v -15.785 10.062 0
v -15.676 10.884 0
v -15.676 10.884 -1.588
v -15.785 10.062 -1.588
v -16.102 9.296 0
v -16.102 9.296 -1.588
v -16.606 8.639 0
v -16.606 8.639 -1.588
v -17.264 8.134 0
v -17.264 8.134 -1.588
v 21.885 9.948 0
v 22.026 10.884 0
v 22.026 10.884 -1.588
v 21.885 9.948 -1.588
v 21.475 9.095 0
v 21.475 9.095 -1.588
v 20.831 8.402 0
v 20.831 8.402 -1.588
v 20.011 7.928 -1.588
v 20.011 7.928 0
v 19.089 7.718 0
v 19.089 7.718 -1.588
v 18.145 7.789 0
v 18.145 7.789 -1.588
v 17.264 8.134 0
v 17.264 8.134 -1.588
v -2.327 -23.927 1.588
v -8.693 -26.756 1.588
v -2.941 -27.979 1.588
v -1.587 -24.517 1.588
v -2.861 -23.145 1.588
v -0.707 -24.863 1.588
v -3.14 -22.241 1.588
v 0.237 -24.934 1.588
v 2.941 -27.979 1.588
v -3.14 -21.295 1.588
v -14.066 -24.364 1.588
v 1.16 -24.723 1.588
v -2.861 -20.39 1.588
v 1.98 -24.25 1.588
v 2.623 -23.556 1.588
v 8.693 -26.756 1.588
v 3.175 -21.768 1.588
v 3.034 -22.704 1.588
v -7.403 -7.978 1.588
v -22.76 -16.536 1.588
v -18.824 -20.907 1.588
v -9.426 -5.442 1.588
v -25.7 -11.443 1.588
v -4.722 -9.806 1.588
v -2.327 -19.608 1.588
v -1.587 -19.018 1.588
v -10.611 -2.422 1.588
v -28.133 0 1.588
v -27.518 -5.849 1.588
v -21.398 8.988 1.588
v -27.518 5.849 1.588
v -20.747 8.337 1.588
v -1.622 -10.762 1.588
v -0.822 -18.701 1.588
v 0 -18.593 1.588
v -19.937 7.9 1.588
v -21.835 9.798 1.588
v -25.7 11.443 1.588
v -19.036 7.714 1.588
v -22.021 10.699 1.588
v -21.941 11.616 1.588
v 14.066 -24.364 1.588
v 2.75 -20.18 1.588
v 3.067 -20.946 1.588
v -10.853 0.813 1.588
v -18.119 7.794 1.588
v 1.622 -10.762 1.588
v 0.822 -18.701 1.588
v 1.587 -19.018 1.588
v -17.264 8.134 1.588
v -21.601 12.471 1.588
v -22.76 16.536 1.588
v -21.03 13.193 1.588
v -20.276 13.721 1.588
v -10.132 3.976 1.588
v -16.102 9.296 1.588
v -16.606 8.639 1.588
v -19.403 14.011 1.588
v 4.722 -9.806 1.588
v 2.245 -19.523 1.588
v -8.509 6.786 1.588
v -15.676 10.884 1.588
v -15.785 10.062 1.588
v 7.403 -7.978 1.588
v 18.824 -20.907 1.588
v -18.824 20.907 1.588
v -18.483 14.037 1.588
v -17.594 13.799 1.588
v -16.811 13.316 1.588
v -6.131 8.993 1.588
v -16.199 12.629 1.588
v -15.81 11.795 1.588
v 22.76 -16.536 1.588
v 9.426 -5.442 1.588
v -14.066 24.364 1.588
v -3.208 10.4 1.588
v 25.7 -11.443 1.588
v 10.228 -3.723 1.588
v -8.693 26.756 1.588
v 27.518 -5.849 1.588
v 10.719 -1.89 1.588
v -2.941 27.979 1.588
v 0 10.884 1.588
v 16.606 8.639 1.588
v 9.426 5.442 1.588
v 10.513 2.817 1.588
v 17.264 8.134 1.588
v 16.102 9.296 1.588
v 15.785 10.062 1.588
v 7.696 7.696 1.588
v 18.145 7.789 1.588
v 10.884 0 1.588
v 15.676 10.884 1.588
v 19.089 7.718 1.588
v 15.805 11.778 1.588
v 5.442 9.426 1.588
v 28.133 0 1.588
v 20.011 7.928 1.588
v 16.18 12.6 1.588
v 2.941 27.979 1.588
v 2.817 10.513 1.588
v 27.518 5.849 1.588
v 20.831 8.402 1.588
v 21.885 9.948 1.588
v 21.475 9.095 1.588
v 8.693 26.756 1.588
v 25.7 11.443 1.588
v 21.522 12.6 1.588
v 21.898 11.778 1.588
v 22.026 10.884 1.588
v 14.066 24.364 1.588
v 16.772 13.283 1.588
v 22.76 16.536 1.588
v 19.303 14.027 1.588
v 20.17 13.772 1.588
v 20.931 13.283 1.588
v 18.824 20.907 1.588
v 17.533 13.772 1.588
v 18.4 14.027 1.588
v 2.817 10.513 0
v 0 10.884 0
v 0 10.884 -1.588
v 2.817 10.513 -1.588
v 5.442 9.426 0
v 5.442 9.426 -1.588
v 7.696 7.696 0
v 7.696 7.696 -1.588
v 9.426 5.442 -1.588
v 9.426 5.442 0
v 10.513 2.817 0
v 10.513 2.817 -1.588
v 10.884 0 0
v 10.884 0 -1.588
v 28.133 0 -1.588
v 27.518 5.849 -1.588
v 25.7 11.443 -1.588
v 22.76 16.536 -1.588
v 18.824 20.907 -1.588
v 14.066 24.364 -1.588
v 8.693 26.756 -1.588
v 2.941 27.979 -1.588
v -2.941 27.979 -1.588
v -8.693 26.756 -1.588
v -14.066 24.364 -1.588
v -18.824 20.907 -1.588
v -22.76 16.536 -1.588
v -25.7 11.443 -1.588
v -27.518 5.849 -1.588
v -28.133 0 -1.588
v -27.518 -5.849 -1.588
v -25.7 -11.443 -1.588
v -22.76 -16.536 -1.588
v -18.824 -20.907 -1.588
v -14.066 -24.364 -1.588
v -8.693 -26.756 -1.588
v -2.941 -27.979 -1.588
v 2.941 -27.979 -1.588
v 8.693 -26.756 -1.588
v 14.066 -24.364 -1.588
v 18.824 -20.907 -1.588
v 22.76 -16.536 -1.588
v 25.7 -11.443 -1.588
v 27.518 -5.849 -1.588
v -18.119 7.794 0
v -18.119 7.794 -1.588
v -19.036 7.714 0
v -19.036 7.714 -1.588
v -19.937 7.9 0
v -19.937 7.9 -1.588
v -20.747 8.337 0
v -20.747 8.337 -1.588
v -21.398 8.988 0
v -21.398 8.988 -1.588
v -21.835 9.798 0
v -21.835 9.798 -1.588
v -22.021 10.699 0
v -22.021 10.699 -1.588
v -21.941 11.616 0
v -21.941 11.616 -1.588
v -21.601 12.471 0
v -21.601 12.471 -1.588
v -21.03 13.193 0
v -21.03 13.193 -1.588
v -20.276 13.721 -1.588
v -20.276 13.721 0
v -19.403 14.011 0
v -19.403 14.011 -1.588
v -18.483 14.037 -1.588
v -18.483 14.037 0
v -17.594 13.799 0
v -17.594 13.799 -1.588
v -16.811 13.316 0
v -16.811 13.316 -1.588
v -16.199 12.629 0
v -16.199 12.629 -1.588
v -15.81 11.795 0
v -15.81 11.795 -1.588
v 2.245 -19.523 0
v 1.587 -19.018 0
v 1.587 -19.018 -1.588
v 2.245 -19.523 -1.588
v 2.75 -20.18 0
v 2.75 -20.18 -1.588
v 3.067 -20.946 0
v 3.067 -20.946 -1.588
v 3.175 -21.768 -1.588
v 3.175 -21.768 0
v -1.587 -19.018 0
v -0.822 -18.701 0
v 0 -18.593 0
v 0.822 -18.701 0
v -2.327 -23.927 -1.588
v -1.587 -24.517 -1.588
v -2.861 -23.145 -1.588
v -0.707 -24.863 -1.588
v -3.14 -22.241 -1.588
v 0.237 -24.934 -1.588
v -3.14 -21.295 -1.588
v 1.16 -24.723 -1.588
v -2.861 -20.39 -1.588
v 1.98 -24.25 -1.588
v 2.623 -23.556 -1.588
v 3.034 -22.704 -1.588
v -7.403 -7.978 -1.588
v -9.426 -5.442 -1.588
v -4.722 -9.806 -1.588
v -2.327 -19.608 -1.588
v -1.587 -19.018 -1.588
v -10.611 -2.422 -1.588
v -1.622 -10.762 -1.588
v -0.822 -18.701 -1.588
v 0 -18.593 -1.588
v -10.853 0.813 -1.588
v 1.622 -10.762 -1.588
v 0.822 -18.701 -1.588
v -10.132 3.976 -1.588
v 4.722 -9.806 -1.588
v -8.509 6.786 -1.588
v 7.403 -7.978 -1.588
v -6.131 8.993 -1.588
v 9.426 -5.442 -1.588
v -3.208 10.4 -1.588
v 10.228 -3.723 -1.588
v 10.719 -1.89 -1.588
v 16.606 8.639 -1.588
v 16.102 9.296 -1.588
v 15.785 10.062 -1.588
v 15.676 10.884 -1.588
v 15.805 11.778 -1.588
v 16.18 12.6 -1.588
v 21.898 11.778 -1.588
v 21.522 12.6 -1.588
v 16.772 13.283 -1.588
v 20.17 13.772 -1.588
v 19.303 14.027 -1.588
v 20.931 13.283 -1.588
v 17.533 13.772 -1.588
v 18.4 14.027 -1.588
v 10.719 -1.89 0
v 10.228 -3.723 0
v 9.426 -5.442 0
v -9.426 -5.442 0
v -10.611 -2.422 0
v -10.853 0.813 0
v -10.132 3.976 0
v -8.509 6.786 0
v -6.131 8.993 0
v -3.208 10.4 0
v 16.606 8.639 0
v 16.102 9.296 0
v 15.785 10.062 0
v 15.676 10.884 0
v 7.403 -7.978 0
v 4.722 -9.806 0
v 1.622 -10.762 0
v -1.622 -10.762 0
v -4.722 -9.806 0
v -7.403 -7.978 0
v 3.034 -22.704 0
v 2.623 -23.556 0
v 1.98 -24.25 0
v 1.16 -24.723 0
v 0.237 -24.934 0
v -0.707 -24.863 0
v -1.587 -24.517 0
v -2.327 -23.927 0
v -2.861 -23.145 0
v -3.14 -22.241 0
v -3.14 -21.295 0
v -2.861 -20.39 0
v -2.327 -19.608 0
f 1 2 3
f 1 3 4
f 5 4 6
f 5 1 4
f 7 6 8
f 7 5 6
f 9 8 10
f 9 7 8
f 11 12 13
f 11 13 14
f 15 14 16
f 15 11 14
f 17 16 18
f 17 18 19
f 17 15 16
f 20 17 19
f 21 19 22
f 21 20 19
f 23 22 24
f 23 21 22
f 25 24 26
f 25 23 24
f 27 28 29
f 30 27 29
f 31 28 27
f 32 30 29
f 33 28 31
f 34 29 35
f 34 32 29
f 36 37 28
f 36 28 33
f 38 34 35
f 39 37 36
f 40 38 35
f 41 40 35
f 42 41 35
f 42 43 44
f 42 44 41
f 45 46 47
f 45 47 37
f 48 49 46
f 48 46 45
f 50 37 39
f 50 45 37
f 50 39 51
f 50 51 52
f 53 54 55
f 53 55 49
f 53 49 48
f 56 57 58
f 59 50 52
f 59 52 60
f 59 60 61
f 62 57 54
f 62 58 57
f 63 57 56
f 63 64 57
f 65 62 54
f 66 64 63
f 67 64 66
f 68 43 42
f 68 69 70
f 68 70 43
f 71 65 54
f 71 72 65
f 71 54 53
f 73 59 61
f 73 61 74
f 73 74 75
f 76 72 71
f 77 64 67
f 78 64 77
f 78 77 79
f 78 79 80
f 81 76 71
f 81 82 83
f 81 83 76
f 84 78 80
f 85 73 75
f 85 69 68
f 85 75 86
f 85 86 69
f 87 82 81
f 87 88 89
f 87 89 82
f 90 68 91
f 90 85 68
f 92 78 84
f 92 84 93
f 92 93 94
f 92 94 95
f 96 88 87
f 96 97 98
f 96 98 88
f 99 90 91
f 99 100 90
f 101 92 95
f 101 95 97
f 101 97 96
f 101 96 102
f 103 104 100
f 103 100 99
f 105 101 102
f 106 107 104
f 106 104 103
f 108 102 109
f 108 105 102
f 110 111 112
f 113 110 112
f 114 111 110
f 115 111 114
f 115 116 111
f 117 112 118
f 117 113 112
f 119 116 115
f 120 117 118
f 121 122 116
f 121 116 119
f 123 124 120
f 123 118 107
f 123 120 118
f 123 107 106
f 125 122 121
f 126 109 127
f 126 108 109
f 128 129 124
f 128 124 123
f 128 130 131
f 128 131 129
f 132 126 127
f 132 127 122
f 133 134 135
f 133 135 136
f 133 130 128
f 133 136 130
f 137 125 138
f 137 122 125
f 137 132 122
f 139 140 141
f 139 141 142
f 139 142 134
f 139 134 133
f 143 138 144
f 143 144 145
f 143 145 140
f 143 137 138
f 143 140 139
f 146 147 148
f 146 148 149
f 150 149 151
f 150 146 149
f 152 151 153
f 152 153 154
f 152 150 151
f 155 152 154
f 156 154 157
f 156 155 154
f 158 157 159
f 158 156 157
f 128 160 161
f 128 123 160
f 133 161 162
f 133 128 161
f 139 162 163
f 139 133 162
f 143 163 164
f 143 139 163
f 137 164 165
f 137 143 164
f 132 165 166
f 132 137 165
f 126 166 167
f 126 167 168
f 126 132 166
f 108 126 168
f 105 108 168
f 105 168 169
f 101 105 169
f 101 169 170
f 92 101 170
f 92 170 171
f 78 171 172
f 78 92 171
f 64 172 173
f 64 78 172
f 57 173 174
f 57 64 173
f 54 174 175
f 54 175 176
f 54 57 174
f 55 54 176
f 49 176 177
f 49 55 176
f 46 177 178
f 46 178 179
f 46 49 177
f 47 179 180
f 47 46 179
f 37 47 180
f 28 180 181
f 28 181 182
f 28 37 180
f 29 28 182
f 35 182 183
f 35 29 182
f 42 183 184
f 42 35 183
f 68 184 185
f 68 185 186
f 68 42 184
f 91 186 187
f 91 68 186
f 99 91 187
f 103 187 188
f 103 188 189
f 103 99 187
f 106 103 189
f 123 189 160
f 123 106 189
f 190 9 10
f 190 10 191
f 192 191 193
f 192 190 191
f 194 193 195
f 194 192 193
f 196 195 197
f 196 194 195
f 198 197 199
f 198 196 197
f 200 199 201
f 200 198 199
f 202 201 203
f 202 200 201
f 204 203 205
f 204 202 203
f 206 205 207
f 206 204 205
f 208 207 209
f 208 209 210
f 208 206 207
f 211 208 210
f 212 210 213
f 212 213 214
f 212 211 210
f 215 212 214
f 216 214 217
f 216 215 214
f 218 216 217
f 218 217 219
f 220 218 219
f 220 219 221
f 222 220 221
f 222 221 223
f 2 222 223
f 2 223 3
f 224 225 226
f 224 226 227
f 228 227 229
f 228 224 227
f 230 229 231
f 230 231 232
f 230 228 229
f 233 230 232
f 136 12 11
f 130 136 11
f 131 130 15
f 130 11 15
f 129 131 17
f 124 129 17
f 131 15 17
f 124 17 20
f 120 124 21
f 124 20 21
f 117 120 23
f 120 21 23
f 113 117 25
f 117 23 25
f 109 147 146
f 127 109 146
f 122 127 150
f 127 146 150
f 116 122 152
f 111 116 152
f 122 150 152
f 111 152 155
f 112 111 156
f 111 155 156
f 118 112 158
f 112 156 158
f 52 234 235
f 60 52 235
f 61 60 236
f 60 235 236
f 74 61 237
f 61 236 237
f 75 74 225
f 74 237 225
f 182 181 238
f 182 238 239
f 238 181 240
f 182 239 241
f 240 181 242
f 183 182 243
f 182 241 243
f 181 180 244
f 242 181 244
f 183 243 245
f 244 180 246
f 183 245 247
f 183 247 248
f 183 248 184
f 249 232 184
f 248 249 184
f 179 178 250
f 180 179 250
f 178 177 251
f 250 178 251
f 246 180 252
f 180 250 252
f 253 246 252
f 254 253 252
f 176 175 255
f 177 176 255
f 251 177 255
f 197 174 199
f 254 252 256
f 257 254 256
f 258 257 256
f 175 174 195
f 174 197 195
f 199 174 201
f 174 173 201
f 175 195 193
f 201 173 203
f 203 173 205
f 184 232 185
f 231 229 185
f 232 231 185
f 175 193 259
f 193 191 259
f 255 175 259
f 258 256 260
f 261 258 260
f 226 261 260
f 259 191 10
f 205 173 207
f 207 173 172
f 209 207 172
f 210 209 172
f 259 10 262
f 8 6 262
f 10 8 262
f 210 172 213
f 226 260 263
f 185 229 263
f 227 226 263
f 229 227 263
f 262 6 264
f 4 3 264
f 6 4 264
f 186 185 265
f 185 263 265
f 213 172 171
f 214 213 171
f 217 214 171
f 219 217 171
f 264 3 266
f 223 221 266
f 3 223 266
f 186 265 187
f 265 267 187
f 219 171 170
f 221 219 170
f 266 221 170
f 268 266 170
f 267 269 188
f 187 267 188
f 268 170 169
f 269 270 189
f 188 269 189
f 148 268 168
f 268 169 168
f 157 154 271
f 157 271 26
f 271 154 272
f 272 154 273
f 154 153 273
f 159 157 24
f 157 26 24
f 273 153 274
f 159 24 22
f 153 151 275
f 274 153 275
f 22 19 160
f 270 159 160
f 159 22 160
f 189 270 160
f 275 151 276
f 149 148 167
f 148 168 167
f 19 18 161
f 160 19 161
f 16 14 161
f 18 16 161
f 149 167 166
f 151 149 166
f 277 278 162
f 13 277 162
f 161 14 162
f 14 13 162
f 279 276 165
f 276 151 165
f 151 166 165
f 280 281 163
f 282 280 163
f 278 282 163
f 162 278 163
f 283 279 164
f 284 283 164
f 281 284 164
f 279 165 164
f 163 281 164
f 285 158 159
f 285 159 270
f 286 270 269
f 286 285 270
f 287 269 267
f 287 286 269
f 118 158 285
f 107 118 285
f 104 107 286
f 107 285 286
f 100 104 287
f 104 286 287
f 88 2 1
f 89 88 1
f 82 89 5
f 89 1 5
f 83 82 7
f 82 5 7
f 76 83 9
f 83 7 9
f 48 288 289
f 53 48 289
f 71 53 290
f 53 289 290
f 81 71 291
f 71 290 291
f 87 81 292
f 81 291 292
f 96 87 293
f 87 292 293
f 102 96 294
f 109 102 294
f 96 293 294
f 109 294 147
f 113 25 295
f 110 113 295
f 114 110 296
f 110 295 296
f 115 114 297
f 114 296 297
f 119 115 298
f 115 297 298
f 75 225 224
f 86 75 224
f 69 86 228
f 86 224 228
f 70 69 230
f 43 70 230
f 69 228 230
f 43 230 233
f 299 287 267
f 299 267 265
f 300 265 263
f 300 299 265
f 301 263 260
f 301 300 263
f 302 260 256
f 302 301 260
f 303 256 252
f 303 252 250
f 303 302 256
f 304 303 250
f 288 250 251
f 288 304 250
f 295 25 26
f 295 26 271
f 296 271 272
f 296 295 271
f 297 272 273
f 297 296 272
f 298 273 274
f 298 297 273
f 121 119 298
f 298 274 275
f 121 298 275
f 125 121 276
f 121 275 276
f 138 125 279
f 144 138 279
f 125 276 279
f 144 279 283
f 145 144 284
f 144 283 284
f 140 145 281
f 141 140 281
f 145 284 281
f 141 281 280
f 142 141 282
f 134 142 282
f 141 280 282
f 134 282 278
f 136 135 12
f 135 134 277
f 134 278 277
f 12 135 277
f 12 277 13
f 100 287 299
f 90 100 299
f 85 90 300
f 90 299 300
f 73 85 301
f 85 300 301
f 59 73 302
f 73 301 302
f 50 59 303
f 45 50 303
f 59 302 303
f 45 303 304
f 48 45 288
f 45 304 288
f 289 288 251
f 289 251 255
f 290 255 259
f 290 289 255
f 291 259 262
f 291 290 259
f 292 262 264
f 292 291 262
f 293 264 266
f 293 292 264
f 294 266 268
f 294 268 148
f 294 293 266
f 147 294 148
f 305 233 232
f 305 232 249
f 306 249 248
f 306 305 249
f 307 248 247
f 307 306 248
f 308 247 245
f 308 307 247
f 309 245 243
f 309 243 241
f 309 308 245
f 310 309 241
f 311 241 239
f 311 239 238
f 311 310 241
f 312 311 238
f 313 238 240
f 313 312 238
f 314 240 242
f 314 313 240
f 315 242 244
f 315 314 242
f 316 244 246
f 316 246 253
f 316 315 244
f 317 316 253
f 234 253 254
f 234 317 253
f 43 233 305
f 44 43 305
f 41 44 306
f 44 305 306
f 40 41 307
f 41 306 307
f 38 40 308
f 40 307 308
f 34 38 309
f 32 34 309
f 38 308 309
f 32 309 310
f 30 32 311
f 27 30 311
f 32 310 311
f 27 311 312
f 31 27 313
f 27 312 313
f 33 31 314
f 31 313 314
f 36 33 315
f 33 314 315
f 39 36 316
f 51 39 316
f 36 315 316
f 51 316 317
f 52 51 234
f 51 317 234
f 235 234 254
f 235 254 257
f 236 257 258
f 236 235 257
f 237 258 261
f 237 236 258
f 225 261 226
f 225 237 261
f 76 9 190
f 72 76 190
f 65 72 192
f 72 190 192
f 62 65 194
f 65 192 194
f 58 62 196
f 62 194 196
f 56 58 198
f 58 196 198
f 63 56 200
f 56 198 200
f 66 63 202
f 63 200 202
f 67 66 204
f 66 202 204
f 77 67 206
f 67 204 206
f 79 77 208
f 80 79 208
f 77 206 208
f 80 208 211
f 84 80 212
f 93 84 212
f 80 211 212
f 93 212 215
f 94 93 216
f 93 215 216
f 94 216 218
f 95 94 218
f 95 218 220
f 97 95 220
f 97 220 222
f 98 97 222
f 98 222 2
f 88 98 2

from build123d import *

# Parameters (mm, degrees)
F0_R     = 28.1326878824
F1_DEPTH = 1.5875


with BuildPart() as f1:
    # F0 (on Top) → F1 (new body, symmetric)
    with BuildSketch(Plane.XY):
        Circle(F0_R)
        with BuildLine():
            Line((-15.6764677845, 10.8839), (0, 10.8839))
            Line((0, 10.8839), (15.6764677845, 10.8839))
            ThreePointArc((15.6764677845, 10.8839), (18.8514677845, 14.0589), (22.0264677845, 10.8839))
            ThreePointArc((22.0264677845, 10.8839), (20.4389677845, 8.134269343), (17.2639677845, 8.134269343))
            Line((17.2639677845, 8.134269343), (9.4257339481, -5.4419499033))
            Line((9.4257339481, -5.4419499033), (1.5875, -19.018169343))
            ThreePointArc((1.5875, -19.018169343), (2.749630657, -20.1803), (3.175, -21.7678))
            ThreePointArc((3.175, -21.7678), (-1.5875, -24.517430657), (-1.5875, -19.018169343))
            Line((-1.5875, -19.018169343), (-9.4257338301, -5.4419501077))
            Line((-9.4257338301, -5.4419501077), (-17.2639677845, 8.134269343))
            ThreePointArc((-17.2639677845, 8.134269343), (-21.6010984415, 12.4714), (-15.6764677845, 10.8839))
        make_face(mode=Mode.SUBTRACT)
        with BuildLine():
            ThreePointArc((0, 10.8839), (7.6960794958, 7.6960794958), (10.8839, 0))
            ThreePointArc((10.8839, 0), (10.5130401152, -2.8169605511), (9.4257339481, -5.4419499033))
            Line((9.4257339481, -5.4419499033), (17.2639677845, 8.134269343))
            ThreePointArc((17.2639677845, 8.134269343), (16.1018371275, 9.2964), (15.6764677845, 10.8839))
            Line((15.6764677845, 10.8839), (0, 10.8839))
        make_face()
        with BuildLine():
            ThreePointArc((-9.4257338301, -5.4419501077), (-9.4257339233, 5.4419499462), (0, 10.8839))
            Line((0, 10.8839), (-15.6764677845, 10.8839))
            ThreePointArc((-15.6764677845, 10.8839), (-16.1018371275, 9.2964), (-17.2639677845, 8.134269343))
            Line((-17.2639677845, 8.134269343), (-9.4257338301, -5.4419501077))
        make_face()
        with BuildLine():
            Line((1.5875, -19.018169343), (9.4257339481, -5.4419499033))
            ThreePointArc((9.4257339481, -5.4419499033), (1.18e-07, -10.8839), (-9.4257338301, -5.4419501077))
            Line((-9.4257338301, -5.4419501077), (-1.5875, -19.018169343))
            ThreePointArc((-1.5875, -19.018169343), (0, -18.5928), (1.5875, -19.018169343))
        make_face()
    extrude(amount=F1_DEPTH, both=True)


solid = f1.part
